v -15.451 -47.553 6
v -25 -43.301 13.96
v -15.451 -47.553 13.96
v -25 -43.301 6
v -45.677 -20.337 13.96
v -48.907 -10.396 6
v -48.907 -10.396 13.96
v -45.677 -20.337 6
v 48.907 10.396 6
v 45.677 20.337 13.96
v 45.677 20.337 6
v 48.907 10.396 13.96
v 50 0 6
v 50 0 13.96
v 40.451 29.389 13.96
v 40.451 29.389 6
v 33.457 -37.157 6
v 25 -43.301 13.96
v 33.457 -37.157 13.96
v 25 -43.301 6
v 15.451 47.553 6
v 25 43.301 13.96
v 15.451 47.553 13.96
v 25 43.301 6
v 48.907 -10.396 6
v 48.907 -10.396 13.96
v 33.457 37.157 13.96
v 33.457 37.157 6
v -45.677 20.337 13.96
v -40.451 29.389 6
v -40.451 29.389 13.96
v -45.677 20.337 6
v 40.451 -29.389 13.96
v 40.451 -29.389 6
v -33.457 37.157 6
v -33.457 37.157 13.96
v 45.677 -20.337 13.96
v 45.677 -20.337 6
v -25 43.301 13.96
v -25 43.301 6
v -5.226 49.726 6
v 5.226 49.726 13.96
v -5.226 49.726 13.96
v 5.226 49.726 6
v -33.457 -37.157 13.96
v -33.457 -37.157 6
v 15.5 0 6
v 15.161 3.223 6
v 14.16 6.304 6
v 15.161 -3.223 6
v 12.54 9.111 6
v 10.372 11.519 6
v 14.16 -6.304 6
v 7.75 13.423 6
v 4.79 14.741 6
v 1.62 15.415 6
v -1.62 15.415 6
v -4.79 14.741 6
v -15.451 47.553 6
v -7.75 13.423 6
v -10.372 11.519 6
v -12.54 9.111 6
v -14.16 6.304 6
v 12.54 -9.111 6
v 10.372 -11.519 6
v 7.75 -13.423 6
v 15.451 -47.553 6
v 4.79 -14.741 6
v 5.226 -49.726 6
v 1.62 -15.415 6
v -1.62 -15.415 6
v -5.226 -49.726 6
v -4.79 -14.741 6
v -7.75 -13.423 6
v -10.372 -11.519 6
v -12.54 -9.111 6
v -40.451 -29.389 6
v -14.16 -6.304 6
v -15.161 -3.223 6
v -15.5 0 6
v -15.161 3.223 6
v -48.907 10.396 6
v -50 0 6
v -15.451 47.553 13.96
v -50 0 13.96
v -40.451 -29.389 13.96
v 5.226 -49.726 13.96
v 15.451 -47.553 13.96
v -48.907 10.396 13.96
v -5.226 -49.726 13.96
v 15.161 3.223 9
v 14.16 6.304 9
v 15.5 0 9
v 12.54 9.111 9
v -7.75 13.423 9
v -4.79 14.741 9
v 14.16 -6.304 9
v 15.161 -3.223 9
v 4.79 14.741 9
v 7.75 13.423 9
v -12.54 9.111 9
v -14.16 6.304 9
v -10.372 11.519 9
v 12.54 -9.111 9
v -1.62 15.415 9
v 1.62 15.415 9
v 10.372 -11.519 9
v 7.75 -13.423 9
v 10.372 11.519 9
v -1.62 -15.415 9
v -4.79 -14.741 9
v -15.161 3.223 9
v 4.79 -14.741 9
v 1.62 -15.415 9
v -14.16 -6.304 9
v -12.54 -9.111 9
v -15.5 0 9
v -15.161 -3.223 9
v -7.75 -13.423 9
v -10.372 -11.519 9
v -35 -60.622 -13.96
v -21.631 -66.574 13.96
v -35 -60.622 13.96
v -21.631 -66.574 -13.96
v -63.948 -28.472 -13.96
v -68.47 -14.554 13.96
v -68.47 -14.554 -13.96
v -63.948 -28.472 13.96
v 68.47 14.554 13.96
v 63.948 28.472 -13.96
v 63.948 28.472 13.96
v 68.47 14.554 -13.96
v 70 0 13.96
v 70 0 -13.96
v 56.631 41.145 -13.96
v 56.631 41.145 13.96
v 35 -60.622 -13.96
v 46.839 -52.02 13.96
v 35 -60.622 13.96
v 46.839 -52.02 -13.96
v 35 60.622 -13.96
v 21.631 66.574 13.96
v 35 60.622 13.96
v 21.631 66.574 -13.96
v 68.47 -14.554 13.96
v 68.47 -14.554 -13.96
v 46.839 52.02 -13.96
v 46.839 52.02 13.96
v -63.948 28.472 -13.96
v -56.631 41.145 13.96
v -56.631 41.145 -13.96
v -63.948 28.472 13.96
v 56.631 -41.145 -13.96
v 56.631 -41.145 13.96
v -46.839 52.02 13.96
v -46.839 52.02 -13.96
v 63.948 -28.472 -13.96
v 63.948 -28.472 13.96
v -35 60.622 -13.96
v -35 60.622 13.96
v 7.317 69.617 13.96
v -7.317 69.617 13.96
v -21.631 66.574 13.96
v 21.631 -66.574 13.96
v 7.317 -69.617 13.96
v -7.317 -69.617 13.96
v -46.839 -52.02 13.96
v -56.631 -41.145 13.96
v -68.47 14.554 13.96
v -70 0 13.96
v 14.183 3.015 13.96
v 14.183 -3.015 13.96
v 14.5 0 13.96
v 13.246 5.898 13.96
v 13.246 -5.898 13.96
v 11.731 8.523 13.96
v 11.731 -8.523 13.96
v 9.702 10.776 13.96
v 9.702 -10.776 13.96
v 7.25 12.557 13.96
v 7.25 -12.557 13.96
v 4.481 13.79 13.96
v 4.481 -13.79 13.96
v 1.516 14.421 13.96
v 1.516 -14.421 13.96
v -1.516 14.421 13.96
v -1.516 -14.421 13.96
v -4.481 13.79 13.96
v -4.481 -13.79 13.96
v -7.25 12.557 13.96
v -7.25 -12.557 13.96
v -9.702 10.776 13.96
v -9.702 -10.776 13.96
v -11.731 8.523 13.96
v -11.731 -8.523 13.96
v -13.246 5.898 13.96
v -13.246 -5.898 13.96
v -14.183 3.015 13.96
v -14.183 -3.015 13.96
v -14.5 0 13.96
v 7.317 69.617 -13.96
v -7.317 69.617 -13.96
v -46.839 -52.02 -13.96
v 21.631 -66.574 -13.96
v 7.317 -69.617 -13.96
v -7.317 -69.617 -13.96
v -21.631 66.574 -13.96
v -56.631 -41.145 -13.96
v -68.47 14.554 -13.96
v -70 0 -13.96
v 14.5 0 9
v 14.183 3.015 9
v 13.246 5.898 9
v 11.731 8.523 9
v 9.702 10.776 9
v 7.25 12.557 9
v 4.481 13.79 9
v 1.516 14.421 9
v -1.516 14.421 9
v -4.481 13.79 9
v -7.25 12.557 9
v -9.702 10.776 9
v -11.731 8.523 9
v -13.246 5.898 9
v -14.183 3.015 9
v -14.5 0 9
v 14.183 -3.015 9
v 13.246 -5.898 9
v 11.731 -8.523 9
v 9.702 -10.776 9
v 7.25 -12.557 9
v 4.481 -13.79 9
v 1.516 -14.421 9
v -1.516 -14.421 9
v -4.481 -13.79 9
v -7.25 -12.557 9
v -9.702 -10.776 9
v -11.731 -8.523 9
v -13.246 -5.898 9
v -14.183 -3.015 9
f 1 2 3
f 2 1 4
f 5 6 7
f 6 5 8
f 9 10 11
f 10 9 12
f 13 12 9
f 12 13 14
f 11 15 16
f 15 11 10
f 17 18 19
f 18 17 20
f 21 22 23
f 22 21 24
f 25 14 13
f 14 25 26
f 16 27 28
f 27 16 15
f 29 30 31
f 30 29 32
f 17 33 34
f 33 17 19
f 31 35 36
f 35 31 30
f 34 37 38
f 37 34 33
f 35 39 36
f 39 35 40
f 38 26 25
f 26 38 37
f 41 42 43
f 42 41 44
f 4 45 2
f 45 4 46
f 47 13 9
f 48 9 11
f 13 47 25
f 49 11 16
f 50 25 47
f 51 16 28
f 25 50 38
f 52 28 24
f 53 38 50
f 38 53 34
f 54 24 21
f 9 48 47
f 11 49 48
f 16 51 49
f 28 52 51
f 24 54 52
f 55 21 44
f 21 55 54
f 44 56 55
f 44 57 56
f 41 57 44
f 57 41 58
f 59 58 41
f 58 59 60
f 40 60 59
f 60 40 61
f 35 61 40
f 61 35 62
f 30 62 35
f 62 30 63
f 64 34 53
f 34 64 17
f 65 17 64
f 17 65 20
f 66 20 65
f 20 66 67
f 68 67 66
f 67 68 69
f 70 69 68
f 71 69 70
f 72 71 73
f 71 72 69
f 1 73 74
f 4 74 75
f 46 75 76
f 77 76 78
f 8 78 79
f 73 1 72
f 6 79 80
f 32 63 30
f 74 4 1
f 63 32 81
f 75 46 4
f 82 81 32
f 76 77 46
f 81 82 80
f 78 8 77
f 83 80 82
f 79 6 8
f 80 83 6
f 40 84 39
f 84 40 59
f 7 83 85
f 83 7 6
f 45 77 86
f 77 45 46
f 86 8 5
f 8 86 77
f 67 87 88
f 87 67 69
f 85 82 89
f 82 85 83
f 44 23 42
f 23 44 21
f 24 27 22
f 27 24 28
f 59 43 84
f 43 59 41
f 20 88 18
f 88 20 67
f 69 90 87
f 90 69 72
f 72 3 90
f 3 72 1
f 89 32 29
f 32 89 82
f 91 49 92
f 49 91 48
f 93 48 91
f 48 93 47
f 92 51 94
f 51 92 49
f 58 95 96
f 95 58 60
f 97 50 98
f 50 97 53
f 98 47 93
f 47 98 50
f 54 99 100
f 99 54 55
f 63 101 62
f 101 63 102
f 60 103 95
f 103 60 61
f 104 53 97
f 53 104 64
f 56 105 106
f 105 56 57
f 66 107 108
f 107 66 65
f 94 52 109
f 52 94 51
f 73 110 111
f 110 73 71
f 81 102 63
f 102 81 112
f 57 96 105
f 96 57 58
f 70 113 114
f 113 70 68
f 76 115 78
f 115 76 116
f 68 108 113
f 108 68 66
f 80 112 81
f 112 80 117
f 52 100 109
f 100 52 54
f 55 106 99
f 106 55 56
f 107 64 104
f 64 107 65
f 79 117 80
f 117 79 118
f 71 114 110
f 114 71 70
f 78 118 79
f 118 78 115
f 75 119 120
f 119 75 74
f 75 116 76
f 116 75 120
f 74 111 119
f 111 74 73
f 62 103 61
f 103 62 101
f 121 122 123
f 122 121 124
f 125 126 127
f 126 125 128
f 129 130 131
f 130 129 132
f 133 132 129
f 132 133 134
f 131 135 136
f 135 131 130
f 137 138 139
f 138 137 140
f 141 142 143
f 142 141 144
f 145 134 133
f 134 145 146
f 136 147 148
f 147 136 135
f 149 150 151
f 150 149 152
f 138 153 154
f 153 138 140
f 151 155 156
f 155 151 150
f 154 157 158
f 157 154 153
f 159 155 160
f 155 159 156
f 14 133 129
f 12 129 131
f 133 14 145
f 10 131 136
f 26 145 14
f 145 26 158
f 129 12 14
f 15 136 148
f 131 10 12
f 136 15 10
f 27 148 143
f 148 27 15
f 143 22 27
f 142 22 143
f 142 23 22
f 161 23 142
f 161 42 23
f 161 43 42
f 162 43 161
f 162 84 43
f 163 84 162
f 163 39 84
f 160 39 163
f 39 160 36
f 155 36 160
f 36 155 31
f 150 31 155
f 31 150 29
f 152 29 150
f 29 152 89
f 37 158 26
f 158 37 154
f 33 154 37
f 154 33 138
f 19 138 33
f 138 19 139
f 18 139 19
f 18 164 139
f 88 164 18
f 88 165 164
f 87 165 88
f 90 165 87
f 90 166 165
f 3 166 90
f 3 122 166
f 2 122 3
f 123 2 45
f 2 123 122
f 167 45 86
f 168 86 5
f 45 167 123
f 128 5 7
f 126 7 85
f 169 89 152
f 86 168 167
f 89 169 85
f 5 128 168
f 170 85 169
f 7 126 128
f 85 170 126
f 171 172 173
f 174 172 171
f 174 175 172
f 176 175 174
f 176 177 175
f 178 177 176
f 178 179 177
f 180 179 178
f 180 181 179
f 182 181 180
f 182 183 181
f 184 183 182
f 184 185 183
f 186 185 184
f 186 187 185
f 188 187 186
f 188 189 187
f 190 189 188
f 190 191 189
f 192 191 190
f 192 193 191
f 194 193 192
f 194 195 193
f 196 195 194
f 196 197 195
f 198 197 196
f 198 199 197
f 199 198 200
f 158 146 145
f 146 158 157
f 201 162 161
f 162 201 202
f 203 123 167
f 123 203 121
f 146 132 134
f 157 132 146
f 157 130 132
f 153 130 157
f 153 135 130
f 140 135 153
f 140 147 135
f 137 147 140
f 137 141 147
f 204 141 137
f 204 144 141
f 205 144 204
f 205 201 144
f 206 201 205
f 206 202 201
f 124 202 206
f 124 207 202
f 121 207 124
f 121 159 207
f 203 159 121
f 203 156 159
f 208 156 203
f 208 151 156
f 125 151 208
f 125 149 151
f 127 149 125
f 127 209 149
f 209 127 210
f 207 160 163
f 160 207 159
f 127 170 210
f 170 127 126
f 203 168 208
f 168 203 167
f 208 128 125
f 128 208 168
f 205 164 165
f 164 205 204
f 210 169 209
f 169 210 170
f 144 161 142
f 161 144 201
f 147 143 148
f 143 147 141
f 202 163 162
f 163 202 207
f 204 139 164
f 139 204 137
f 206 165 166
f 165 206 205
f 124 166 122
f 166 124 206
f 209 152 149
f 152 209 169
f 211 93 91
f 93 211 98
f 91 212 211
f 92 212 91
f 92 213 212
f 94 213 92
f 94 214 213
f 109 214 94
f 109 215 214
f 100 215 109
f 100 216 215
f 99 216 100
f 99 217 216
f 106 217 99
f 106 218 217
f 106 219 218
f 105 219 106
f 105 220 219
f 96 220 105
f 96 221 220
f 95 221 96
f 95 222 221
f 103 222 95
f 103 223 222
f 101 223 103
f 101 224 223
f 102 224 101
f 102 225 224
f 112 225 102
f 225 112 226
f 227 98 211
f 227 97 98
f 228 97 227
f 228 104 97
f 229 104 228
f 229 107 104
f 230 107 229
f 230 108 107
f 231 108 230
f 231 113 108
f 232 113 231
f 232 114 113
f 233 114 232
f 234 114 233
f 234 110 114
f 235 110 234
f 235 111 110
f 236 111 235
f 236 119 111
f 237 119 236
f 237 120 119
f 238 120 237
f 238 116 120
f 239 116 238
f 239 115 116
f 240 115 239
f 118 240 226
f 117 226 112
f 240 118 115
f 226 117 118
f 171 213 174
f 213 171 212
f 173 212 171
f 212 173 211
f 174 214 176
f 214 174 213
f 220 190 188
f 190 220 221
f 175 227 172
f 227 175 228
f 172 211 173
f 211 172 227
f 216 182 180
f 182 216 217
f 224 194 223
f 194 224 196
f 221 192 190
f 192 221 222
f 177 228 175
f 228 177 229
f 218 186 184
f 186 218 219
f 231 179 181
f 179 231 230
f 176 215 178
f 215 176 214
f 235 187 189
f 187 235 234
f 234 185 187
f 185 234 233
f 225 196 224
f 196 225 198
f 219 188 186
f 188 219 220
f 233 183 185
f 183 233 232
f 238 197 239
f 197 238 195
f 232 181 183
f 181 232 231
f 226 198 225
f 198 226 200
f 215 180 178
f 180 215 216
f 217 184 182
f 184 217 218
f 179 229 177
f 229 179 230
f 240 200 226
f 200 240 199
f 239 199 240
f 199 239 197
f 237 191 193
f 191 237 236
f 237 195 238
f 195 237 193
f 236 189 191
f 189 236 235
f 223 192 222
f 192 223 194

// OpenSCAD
 
difference()
  {
  difference()
    {
        cylinder(h=27.92, r1=70, r2=70,center=true);
        translate([0,0,20]) {
        difference()
            {
            cylinder(28,r1=50,r2=50,center=true);
            cylinder(60,r1=15.5,r2=15.5,center=true);   
            }
        }
}
   translate([0,0,30]) {
  difference()
 {
    cylinder(42,r1=44,r2=44,center=true);
    cylinder(60,r1=14.5,r2=14.5,center=true);   
 }
}
}




 
 
 
